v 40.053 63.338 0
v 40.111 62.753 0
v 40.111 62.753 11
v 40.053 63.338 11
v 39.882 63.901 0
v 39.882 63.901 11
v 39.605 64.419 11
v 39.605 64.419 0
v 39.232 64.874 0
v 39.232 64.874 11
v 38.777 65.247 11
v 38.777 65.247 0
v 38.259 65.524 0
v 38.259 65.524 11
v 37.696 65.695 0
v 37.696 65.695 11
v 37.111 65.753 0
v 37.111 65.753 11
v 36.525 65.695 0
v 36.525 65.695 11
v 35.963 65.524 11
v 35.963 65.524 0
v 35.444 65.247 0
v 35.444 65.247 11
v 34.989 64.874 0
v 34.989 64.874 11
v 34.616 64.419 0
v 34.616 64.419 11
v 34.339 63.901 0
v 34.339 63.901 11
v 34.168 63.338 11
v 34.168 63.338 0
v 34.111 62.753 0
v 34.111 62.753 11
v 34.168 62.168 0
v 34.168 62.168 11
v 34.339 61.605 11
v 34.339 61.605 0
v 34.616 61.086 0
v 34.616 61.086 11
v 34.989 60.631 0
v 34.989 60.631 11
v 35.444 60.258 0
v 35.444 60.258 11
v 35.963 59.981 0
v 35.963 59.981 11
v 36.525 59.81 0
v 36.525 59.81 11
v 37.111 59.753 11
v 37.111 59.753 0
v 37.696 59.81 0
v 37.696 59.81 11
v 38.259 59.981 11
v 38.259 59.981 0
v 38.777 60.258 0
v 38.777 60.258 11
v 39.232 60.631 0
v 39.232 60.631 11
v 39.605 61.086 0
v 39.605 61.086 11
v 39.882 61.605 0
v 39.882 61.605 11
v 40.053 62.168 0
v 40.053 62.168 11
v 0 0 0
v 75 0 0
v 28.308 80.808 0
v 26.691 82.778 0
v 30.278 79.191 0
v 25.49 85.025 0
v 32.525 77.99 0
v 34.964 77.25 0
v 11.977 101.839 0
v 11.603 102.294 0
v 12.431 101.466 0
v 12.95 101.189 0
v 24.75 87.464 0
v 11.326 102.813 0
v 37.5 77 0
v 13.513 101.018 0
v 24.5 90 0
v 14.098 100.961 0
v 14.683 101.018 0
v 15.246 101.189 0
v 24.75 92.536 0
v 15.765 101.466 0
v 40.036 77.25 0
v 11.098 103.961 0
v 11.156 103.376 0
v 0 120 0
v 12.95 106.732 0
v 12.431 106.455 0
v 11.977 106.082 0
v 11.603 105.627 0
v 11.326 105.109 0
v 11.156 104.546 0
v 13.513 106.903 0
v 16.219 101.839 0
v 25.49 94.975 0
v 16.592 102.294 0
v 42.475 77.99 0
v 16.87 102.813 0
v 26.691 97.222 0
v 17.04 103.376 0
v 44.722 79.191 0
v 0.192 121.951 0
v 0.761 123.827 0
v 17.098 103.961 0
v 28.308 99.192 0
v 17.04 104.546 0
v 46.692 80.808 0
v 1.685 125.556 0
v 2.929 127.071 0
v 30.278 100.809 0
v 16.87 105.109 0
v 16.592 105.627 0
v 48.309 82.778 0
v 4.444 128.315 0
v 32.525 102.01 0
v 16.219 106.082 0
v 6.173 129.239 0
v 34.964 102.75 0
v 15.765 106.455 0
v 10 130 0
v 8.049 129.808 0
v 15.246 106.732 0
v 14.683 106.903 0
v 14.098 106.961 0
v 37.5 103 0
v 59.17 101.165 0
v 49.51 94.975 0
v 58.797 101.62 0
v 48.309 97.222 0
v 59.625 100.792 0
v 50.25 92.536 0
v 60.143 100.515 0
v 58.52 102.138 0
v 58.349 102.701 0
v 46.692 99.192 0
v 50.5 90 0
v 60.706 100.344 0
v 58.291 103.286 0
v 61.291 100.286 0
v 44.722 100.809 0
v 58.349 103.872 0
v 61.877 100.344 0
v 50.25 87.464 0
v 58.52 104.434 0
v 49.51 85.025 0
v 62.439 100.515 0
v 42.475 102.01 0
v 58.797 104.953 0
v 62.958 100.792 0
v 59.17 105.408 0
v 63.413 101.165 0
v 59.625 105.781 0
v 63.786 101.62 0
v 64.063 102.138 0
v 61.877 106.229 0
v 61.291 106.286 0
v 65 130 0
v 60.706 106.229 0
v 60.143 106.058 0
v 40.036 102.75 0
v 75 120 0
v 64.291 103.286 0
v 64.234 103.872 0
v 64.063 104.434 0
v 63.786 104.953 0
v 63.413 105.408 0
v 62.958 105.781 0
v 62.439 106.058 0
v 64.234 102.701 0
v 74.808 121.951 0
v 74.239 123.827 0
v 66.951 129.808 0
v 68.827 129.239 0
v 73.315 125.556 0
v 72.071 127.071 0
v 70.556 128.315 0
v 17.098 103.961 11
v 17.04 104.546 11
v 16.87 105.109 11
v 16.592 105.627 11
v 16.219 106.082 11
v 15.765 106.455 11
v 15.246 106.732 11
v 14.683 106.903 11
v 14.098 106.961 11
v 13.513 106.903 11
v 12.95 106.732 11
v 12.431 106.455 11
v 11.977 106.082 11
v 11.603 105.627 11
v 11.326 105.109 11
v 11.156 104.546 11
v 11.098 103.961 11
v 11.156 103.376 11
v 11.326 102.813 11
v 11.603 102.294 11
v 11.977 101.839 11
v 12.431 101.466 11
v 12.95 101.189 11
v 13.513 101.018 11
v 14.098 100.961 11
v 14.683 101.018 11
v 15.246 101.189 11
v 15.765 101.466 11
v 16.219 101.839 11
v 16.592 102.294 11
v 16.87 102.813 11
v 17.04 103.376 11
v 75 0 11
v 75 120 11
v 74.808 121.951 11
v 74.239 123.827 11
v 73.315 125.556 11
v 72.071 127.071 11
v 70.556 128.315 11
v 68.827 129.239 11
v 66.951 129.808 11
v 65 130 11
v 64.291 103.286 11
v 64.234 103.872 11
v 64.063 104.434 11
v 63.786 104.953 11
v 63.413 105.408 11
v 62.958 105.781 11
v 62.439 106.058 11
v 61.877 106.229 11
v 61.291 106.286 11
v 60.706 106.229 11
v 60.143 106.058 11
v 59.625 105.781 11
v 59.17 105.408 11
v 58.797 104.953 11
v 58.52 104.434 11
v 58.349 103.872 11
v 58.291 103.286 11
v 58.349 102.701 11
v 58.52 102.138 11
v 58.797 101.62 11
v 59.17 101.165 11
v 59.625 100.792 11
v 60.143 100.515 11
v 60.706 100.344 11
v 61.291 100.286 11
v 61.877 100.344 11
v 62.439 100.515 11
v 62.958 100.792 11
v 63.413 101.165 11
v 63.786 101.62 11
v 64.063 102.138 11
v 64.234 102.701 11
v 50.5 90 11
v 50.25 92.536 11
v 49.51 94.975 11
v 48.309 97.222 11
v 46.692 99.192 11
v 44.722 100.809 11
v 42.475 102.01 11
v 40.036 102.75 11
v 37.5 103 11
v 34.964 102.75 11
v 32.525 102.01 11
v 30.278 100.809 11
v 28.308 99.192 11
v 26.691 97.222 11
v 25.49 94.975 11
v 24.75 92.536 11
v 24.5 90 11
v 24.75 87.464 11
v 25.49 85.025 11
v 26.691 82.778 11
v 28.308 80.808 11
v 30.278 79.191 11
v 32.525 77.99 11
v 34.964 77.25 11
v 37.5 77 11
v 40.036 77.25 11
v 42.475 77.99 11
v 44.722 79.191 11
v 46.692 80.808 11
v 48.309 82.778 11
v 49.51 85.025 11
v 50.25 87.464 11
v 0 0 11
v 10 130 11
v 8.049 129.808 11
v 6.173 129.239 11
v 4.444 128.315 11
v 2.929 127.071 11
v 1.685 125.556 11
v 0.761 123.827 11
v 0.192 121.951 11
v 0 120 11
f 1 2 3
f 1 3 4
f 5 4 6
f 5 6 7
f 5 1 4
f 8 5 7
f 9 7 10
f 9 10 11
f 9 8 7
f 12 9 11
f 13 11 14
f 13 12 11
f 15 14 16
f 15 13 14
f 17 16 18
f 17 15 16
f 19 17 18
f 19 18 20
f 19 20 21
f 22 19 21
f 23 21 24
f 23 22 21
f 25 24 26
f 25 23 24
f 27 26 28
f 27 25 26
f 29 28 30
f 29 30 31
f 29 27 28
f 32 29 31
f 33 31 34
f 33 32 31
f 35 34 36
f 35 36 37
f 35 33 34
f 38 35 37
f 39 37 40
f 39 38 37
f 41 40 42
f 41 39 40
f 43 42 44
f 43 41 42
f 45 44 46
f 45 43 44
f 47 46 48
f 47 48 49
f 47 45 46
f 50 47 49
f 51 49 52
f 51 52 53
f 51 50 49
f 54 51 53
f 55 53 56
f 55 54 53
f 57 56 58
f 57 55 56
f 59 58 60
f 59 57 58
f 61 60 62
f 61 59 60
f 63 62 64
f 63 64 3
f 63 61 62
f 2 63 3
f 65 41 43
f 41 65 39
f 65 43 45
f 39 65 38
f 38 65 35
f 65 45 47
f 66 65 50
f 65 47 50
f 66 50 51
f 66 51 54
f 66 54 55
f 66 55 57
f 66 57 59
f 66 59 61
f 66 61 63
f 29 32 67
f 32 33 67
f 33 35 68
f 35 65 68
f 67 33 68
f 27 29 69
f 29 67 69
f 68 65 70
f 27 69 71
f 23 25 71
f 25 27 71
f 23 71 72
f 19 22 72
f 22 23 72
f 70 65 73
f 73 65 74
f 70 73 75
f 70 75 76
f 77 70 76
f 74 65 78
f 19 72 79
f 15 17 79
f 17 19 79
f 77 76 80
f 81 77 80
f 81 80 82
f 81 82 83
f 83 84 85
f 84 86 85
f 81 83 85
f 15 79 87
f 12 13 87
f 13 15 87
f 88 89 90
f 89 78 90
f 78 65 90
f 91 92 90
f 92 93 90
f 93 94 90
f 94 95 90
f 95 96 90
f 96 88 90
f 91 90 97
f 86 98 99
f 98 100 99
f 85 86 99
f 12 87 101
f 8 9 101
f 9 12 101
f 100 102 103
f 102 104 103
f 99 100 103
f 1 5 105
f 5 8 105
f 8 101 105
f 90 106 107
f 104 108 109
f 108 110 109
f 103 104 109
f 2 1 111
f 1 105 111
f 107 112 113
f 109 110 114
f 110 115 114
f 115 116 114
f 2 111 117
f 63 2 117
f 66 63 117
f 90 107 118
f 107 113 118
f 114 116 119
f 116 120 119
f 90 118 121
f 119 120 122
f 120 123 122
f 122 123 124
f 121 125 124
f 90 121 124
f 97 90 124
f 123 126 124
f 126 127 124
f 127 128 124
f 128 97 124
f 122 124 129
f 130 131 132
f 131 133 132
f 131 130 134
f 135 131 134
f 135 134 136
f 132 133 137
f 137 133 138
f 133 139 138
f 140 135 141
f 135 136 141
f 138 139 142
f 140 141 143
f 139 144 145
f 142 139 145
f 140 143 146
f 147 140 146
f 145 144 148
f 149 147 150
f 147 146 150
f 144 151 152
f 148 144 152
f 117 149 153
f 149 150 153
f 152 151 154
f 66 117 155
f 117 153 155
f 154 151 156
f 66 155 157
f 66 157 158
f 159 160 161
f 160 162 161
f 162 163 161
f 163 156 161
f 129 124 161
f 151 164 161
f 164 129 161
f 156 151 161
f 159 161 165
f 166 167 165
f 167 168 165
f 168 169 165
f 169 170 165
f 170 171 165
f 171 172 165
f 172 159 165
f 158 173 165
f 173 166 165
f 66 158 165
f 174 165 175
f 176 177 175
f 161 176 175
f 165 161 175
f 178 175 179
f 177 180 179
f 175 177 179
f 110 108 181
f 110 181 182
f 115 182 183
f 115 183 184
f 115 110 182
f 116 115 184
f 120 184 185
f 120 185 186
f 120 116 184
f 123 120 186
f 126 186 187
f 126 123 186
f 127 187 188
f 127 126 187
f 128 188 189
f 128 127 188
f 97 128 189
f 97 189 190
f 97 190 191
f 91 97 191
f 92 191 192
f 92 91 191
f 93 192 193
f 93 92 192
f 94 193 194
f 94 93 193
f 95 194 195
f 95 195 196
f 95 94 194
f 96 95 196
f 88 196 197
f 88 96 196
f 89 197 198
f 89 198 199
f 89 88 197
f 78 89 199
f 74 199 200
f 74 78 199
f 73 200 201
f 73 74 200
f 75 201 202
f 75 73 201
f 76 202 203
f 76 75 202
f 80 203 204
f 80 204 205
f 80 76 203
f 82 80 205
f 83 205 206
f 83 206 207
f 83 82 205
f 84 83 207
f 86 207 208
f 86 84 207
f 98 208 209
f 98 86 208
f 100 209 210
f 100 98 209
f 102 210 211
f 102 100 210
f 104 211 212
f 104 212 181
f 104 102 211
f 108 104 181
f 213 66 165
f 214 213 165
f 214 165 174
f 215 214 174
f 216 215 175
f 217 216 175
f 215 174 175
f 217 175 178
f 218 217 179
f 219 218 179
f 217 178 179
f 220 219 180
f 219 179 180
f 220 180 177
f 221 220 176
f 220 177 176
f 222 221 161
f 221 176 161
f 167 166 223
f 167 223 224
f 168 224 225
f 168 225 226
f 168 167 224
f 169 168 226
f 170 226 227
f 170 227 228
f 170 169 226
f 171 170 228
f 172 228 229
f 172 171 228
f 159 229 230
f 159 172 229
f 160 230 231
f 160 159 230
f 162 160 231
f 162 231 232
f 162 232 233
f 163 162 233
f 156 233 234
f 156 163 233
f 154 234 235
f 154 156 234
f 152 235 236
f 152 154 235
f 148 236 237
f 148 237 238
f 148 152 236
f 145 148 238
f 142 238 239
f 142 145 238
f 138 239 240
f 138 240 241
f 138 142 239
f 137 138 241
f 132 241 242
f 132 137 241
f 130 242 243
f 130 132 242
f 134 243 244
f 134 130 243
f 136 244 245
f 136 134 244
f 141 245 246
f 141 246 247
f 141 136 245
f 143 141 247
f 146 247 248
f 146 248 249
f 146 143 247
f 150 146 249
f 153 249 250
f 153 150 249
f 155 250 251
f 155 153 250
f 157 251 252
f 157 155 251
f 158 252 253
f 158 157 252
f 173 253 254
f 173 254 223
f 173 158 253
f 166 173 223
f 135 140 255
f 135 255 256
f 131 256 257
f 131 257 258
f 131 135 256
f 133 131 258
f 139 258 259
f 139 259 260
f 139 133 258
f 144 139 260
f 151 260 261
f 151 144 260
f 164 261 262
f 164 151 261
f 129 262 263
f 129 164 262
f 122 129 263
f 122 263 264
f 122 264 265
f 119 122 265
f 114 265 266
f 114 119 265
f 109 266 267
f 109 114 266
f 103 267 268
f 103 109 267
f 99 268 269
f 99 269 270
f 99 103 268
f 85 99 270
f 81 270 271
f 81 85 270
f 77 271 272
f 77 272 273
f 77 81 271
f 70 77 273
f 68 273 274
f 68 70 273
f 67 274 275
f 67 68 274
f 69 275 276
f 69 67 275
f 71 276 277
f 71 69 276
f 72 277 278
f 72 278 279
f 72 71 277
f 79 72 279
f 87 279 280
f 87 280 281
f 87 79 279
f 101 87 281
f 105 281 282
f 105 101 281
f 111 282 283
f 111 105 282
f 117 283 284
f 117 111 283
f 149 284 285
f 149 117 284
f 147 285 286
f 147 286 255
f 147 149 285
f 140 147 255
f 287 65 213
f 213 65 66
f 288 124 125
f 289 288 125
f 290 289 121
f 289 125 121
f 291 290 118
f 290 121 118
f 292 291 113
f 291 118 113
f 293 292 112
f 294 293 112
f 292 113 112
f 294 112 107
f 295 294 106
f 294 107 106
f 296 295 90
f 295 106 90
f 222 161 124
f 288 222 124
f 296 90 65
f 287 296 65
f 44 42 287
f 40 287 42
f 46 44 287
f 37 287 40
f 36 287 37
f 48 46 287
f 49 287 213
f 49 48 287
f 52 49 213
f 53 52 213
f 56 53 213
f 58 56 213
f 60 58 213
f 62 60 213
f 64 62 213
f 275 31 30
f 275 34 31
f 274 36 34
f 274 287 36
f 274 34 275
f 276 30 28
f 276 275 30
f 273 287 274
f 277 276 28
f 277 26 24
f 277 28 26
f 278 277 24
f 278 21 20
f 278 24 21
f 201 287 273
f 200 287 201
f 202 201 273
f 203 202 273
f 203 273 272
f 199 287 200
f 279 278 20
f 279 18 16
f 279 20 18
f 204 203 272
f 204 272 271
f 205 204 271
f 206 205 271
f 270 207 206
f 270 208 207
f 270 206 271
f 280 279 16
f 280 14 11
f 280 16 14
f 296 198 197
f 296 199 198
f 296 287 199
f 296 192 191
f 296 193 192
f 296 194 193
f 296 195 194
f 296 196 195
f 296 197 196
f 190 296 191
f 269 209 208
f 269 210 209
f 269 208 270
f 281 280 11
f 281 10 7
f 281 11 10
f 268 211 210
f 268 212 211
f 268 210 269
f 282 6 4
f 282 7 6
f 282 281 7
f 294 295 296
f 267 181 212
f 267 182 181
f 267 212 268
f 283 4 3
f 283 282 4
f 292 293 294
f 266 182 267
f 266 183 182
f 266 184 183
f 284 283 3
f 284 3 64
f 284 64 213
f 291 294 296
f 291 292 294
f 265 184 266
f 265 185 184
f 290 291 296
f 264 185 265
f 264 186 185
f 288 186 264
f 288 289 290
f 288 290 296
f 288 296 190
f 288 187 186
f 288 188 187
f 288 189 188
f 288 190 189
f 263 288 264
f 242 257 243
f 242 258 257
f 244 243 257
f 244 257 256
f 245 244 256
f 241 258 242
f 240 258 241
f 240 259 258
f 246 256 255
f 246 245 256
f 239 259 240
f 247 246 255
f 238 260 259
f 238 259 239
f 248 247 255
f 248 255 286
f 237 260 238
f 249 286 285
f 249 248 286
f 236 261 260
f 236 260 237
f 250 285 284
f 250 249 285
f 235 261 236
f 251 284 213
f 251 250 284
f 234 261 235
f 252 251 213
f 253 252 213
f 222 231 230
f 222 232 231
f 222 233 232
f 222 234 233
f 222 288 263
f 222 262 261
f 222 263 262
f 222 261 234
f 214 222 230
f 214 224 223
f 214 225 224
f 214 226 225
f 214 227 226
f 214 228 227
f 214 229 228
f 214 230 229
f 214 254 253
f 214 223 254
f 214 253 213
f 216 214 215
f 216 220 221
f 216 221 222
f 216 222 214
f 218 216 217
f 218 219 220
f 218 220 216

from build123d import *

# Parameters (mm, degrees)
SKETCH2_R           = 13
SKETCH2_R_2         = 3
BOSS_EXTRUDE1_DEPTH = 11


with BuildPart() as part:
    # Sketch2 → Boss-Extrude1 (new body)
    with BuildSketch(Plane.XY):
        with BuildLine():
            Line((0, 0), (75, 0))
            Line((75, 0), (75, 120))
            ThreePointArc((75, 120), (72.071067812, 127.071067812), (65, 130))
            Line((65, 130), (10, 130))
            ThreePointArc((10, 130), (2.928932188, 127.071067812), (0, 120))
            Line((0, 120), (0, 0))
        make_face()
        with Locations((37.5, 90)):
            Circle(SKETCH2_R, mode=Mode.SUBTRACT)
        with Locations((61.291446946, 103.286442421)):
            Circle(SKETCH2_R_2, mode=Mode.SUBTRACT)
        with Locations((14.097879865, 103.960776238)):
            Circle(SKETCH2_R_2, mode=Mode.SUBTRACT)
        with Locations((37.110673189, 62.752781341)):
            Circle(SKETCH2_R_2, mode=Mode.SUBTRACT)
    extrude(amount=BOSS_EXTRUDE1_DEPTH)


solid = part.part
